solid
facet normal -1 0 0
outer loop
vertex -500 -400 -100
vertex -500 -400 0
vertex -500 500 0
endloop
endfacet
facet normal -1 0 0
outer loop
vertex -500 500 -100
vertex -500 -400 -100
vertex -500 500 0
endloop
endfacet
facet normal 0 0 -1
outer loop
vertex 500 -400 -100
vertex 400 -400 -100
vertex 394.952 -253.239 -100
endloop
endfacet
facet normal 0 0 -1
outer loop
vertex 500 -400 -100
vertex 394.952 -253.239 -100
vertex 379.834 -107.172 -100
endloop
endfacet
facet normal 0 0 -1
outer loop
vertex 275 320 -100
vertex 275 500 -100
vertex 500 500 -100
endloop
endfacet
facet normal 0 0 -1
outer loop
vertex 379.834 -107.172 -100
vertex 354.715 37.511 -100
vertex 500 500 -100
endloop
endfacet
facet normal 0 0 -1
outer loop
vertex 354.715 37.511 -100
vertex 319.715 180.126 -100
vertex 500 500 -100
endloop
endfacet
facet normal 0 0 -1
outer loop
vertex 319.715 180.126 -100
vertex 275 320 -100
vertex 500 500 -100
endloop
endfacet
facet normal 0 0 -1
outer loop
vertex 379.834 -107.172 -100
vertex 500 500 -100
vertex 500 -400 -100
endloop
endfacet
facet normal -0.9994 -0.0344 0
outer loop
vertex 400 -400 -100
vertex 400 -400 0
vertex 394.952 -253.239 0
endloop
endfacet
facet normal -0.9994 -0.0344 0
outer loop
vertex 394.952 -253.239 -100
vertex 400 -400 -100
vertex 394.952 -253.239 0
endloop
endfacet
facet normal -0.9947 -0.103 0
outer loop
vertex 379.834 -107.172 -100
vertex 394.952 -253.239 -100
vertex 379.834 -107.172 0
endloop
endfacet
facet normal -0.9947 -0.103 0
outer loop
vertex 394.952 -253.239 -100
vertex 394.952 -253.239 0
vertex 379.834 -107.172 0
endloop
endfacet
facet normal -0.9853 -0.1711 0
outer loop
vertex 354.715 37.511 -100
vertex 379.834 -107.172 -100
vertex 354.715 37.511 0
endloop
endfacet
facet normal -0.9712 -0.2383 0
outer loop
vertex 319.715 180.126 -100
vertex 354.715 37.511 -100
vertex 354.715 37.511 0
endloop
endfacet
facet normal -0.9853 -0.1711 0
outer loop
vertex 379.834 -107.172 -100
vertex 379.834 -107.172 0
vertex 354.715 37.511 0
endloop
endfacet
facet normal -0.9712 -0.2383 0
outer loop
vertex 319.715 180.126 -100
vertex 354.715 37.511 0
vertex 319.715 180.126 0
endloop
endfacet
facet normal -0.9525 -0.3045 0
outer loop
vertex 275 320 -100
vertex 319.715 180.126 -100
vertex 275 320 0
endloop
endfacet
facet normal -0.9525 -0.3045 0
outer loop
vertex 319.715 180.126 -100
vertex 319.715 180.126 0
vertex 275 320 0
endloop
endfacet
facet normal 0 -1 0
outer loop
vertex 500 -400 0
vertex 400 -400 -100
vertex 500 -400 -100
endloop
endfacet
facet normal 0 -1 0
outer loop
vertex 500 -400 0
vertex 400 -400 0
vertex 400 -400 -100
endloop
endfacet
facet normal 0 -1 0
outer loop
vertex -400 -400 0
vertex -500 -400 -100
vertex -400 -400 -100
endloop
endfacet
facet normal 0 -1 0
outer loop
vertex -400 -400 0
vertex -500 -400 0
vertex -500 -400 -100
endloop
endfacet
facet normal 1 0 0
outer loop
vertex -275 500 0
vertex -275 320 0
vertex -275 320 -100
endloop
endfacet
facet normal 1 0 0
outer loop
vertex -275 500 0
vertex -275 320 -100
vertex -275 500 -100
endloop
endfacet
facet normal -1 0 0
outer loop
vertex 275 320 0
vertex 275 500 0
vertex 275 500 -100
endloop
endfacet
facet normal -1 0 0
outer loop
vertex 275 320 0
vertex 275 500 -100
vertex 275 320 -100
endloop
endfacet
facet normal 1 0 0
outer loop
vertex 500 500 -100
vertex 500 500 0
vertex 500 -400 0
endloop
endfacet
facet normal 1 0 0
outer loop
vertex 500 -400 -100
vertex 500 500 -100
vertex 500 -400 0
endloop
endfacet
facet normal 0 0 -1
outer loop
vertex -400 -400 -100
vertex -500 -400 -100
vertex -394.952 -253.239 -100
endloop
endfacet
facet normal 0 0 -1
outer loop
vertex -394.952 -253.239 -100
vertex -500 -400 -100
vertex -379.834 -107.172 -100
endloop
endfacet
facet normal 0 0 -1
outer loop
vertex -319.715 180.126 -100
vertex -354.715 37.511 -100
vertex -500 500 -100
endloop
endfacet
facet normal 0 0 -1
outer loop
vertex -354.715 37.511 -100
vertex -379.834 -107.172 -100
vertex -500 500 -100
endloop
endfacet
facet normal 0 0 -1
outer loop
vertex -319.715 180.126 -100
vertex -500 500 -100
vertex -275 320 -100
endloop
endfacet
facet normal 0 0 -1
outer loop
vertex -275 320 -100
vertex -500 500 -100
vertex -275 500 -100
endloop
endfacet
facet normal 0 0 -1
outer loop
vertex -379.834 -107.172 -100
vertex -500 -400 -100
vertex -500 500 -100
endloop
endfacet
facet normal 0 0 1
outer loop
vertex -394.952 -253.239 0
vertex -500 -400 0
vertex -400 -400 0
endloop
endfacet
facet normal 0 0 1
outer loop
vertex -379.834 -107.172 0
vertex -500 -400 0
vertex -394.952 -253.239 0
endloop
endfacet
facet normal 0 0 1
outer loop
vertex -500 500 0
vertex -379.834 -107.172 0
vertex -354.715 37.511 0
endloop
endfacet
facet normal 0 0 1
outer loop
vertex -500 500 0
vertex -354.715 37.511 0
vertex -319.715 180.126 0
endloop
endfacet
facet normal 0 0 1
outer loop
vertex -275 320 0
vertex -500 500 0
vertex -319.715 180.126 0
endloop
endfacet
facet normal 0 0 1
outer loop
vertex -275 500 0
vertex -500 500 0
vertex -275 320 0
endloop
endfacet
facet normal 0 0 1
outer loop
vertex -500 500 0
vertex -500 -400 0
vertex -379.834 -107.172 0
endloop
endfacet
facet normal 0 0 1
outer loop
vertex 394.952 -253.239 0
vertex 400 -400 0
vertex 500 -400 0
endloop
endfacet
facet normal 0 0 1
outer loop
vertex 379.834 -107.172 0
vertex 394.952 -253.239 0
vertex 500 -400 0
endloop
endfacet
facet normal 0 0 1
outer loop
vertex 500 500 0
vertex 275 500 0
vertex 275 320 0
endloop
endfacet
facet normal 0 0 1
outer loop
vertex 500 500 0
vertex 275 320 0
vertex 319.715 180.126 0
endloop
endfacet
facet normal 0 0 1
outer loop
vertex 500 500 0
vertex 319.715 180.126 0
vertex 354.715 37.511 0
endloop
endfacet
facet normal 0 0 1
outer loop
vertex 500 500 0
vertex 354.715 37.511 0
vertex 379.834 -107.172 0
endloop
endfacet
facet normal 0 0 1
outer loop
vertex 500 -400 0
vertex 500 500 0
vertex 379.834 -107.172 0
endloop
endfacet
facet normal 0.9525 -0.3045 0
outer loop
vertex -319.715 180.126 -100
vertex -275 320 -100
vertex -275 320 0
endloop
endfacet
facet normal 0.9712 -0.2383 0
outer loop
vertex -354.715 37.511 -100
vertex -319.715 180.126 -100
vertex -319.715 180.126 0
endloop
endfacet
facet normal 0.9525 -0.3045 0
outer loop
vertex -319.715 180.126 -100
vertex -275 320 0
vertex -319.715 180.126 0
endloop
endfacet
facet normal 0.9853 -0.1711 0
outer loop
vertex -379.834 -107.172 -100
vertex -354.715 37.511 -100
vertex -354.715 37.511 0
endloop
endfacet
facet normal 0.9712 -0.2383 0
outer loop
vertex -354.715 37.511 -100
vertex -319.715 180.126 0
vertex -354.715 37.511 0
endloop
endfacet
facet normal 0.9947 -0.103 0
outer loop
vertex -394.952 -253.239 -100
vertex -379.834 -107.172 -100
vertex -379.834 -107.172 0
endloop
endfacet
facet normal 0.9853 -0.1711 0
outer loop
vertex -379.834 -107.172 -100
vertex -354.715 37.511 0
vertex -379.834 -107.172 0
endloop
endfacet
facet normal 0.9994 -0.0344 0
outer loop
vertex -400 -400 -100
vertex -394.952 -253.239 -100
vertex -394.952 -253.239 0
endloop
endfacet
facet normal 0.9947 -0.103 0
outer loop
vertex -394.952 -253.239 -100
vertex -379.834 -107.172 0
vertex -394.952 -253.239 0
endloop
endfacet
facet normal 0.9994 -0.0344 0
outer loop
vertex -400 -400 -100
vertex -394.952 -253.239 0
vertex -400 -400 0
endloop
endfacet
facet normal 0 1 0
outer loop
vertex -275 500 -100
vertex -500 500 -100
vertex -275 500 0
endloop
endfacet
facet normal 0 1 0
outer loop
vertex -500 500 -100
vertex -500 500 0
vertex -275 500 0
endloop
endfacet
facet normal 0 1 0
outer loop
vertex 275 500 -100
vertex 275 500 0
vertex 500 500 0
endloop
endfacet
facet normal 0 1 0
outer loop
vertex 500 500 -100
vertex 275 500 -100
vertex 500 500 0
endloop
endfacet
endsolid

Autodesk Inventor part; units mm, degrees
ref_plane "YZ Plane" through (0, 0, 0) normal (1, 0, 0) x (0, 1, 0)
ref_plane "XZ Plane" through (0, 0, 0) normal (0, 1, 0) x (-1, 0, 0)
ref_plane "XY Plane" through (0, 0, 0) normal (0, 0, 1) x (1, 0, 0)
sketch "Skizze3" plane through (0, 0, 0) normal (0, 0, 1) x (1, 0, 0)
  line L0 (-500, 500) -> (500, 500)
  line L1 (500, 500) -> (500, -500)
  line L2 (500, -500) -> (-500, -500)
  line L3 (-500, -500) -> (-500, 500)
  line L4 (-500, -400) -> (500, -400)
  line L5 (-275, 500) -> (275, 500)
  line L6 (275, 500) -> (275, 320)
  line L7 (275, 320) -> (-275, 320)
  line L8 (-275, 320) -> (-275, 500)
  arc A0 (-275, 320) -> (-400, -400) centre (1736.1, -400) ccw
  arc A1 (400, -400) -> (275, 320) centre (-1736.1, -400) ccw
  line L9 (-160, 320) -> (160, 320)
  line L10 (160, 320) -> (160, 360)
  line L11 (160, 360) -> (-160, 360)
  line L12 (-160, 360) -> (-160, 320)
  line L13 (-440, -450) -> (-140, -450)
  line L14 (90, -450) -> (440, -450)
  line L15 (-30, 360) -> (-30, 320)
  arc A2 (-440, -450) -> (-160, 320) centre (-1358.75, 320) ccw
  arc A3 (-140, -450) -> (-30, 320) centre (-2780, 320) ccw
  arc A4 (-30, 320) -> (90, -450) centre (2500.4167, 320) ccw
  arc A5 (160, 320) -> (440, -450) centre (1358.75, 320) ccw
  line L16 (-160, 360) -> (-440, -450) construction
  line L17 (-160, 360) -> (-146.1239, 400.1416) construction
  line L18 (-30, 360) -> (-146.1239, 400.1416) construction
  line L19 (-30, 360) -> (121.8543, 307.5071) construction
  line L20 (-440, -450) -> (-172.0218, -542.6344) construction
  line L21 (-140, -450) -> (-172.0218, -542.6344) construction
  line L22 (-140, -450) -> (121.8543, 307.5071) construction
  line L23 (-172.9217, 310.595) -> (139.7195, 418.6685) construction
  line L24 (139.7195, 418.6685) -> (440, -450) construction
  line L25 (440, -450) -> (127.3587, -558.0735) construction
  line L26 (127.3587, -558.0735) -> (-172.9217, 310.595) construction
  point P0 (0, 0)
  point P1 (-500, 0)
  point P2 (0, 500)
  point P3 (0, 320)
  point P4 (0, 360)
  dimension "d4" = 1000
  dimension "d5" = 1000
  dimension "d6" = 100
  dimension "d7" = 550
  dimension "d8" = 180
  dimension "d9" = 100
  dimension "d10" = 100
  dimension "d11" = 320
  dimension "d12" = 300
  dimension "d13" = 350
  dimension "d14" = 230
  dimension "d15" = 60
  dimension "d16" = -60
  dimension "d17" = 130
  dimension "d18" = 190
  dimension "d19" = 50
  dimension "d21" = 283.5374
  dimension "d22" = 40
  dimension "d23" = 140
  dimension "d24" = 899.502
  dimension "d25" = 919.1046
  dimension "d26" = 330.7937
extrude "Extrusion4" add sketch "Skizze3" against normal blind 100 contours L0 L8 A0 A2 L4 L3 | L0 L1 L4 A5 A1 L6 | A2 A0 L4 | A5 L4 A1
equation "\"d9\" = d6"
equation "\"d10\" = d6"
properties part number "UA-072-EinfassungST"
